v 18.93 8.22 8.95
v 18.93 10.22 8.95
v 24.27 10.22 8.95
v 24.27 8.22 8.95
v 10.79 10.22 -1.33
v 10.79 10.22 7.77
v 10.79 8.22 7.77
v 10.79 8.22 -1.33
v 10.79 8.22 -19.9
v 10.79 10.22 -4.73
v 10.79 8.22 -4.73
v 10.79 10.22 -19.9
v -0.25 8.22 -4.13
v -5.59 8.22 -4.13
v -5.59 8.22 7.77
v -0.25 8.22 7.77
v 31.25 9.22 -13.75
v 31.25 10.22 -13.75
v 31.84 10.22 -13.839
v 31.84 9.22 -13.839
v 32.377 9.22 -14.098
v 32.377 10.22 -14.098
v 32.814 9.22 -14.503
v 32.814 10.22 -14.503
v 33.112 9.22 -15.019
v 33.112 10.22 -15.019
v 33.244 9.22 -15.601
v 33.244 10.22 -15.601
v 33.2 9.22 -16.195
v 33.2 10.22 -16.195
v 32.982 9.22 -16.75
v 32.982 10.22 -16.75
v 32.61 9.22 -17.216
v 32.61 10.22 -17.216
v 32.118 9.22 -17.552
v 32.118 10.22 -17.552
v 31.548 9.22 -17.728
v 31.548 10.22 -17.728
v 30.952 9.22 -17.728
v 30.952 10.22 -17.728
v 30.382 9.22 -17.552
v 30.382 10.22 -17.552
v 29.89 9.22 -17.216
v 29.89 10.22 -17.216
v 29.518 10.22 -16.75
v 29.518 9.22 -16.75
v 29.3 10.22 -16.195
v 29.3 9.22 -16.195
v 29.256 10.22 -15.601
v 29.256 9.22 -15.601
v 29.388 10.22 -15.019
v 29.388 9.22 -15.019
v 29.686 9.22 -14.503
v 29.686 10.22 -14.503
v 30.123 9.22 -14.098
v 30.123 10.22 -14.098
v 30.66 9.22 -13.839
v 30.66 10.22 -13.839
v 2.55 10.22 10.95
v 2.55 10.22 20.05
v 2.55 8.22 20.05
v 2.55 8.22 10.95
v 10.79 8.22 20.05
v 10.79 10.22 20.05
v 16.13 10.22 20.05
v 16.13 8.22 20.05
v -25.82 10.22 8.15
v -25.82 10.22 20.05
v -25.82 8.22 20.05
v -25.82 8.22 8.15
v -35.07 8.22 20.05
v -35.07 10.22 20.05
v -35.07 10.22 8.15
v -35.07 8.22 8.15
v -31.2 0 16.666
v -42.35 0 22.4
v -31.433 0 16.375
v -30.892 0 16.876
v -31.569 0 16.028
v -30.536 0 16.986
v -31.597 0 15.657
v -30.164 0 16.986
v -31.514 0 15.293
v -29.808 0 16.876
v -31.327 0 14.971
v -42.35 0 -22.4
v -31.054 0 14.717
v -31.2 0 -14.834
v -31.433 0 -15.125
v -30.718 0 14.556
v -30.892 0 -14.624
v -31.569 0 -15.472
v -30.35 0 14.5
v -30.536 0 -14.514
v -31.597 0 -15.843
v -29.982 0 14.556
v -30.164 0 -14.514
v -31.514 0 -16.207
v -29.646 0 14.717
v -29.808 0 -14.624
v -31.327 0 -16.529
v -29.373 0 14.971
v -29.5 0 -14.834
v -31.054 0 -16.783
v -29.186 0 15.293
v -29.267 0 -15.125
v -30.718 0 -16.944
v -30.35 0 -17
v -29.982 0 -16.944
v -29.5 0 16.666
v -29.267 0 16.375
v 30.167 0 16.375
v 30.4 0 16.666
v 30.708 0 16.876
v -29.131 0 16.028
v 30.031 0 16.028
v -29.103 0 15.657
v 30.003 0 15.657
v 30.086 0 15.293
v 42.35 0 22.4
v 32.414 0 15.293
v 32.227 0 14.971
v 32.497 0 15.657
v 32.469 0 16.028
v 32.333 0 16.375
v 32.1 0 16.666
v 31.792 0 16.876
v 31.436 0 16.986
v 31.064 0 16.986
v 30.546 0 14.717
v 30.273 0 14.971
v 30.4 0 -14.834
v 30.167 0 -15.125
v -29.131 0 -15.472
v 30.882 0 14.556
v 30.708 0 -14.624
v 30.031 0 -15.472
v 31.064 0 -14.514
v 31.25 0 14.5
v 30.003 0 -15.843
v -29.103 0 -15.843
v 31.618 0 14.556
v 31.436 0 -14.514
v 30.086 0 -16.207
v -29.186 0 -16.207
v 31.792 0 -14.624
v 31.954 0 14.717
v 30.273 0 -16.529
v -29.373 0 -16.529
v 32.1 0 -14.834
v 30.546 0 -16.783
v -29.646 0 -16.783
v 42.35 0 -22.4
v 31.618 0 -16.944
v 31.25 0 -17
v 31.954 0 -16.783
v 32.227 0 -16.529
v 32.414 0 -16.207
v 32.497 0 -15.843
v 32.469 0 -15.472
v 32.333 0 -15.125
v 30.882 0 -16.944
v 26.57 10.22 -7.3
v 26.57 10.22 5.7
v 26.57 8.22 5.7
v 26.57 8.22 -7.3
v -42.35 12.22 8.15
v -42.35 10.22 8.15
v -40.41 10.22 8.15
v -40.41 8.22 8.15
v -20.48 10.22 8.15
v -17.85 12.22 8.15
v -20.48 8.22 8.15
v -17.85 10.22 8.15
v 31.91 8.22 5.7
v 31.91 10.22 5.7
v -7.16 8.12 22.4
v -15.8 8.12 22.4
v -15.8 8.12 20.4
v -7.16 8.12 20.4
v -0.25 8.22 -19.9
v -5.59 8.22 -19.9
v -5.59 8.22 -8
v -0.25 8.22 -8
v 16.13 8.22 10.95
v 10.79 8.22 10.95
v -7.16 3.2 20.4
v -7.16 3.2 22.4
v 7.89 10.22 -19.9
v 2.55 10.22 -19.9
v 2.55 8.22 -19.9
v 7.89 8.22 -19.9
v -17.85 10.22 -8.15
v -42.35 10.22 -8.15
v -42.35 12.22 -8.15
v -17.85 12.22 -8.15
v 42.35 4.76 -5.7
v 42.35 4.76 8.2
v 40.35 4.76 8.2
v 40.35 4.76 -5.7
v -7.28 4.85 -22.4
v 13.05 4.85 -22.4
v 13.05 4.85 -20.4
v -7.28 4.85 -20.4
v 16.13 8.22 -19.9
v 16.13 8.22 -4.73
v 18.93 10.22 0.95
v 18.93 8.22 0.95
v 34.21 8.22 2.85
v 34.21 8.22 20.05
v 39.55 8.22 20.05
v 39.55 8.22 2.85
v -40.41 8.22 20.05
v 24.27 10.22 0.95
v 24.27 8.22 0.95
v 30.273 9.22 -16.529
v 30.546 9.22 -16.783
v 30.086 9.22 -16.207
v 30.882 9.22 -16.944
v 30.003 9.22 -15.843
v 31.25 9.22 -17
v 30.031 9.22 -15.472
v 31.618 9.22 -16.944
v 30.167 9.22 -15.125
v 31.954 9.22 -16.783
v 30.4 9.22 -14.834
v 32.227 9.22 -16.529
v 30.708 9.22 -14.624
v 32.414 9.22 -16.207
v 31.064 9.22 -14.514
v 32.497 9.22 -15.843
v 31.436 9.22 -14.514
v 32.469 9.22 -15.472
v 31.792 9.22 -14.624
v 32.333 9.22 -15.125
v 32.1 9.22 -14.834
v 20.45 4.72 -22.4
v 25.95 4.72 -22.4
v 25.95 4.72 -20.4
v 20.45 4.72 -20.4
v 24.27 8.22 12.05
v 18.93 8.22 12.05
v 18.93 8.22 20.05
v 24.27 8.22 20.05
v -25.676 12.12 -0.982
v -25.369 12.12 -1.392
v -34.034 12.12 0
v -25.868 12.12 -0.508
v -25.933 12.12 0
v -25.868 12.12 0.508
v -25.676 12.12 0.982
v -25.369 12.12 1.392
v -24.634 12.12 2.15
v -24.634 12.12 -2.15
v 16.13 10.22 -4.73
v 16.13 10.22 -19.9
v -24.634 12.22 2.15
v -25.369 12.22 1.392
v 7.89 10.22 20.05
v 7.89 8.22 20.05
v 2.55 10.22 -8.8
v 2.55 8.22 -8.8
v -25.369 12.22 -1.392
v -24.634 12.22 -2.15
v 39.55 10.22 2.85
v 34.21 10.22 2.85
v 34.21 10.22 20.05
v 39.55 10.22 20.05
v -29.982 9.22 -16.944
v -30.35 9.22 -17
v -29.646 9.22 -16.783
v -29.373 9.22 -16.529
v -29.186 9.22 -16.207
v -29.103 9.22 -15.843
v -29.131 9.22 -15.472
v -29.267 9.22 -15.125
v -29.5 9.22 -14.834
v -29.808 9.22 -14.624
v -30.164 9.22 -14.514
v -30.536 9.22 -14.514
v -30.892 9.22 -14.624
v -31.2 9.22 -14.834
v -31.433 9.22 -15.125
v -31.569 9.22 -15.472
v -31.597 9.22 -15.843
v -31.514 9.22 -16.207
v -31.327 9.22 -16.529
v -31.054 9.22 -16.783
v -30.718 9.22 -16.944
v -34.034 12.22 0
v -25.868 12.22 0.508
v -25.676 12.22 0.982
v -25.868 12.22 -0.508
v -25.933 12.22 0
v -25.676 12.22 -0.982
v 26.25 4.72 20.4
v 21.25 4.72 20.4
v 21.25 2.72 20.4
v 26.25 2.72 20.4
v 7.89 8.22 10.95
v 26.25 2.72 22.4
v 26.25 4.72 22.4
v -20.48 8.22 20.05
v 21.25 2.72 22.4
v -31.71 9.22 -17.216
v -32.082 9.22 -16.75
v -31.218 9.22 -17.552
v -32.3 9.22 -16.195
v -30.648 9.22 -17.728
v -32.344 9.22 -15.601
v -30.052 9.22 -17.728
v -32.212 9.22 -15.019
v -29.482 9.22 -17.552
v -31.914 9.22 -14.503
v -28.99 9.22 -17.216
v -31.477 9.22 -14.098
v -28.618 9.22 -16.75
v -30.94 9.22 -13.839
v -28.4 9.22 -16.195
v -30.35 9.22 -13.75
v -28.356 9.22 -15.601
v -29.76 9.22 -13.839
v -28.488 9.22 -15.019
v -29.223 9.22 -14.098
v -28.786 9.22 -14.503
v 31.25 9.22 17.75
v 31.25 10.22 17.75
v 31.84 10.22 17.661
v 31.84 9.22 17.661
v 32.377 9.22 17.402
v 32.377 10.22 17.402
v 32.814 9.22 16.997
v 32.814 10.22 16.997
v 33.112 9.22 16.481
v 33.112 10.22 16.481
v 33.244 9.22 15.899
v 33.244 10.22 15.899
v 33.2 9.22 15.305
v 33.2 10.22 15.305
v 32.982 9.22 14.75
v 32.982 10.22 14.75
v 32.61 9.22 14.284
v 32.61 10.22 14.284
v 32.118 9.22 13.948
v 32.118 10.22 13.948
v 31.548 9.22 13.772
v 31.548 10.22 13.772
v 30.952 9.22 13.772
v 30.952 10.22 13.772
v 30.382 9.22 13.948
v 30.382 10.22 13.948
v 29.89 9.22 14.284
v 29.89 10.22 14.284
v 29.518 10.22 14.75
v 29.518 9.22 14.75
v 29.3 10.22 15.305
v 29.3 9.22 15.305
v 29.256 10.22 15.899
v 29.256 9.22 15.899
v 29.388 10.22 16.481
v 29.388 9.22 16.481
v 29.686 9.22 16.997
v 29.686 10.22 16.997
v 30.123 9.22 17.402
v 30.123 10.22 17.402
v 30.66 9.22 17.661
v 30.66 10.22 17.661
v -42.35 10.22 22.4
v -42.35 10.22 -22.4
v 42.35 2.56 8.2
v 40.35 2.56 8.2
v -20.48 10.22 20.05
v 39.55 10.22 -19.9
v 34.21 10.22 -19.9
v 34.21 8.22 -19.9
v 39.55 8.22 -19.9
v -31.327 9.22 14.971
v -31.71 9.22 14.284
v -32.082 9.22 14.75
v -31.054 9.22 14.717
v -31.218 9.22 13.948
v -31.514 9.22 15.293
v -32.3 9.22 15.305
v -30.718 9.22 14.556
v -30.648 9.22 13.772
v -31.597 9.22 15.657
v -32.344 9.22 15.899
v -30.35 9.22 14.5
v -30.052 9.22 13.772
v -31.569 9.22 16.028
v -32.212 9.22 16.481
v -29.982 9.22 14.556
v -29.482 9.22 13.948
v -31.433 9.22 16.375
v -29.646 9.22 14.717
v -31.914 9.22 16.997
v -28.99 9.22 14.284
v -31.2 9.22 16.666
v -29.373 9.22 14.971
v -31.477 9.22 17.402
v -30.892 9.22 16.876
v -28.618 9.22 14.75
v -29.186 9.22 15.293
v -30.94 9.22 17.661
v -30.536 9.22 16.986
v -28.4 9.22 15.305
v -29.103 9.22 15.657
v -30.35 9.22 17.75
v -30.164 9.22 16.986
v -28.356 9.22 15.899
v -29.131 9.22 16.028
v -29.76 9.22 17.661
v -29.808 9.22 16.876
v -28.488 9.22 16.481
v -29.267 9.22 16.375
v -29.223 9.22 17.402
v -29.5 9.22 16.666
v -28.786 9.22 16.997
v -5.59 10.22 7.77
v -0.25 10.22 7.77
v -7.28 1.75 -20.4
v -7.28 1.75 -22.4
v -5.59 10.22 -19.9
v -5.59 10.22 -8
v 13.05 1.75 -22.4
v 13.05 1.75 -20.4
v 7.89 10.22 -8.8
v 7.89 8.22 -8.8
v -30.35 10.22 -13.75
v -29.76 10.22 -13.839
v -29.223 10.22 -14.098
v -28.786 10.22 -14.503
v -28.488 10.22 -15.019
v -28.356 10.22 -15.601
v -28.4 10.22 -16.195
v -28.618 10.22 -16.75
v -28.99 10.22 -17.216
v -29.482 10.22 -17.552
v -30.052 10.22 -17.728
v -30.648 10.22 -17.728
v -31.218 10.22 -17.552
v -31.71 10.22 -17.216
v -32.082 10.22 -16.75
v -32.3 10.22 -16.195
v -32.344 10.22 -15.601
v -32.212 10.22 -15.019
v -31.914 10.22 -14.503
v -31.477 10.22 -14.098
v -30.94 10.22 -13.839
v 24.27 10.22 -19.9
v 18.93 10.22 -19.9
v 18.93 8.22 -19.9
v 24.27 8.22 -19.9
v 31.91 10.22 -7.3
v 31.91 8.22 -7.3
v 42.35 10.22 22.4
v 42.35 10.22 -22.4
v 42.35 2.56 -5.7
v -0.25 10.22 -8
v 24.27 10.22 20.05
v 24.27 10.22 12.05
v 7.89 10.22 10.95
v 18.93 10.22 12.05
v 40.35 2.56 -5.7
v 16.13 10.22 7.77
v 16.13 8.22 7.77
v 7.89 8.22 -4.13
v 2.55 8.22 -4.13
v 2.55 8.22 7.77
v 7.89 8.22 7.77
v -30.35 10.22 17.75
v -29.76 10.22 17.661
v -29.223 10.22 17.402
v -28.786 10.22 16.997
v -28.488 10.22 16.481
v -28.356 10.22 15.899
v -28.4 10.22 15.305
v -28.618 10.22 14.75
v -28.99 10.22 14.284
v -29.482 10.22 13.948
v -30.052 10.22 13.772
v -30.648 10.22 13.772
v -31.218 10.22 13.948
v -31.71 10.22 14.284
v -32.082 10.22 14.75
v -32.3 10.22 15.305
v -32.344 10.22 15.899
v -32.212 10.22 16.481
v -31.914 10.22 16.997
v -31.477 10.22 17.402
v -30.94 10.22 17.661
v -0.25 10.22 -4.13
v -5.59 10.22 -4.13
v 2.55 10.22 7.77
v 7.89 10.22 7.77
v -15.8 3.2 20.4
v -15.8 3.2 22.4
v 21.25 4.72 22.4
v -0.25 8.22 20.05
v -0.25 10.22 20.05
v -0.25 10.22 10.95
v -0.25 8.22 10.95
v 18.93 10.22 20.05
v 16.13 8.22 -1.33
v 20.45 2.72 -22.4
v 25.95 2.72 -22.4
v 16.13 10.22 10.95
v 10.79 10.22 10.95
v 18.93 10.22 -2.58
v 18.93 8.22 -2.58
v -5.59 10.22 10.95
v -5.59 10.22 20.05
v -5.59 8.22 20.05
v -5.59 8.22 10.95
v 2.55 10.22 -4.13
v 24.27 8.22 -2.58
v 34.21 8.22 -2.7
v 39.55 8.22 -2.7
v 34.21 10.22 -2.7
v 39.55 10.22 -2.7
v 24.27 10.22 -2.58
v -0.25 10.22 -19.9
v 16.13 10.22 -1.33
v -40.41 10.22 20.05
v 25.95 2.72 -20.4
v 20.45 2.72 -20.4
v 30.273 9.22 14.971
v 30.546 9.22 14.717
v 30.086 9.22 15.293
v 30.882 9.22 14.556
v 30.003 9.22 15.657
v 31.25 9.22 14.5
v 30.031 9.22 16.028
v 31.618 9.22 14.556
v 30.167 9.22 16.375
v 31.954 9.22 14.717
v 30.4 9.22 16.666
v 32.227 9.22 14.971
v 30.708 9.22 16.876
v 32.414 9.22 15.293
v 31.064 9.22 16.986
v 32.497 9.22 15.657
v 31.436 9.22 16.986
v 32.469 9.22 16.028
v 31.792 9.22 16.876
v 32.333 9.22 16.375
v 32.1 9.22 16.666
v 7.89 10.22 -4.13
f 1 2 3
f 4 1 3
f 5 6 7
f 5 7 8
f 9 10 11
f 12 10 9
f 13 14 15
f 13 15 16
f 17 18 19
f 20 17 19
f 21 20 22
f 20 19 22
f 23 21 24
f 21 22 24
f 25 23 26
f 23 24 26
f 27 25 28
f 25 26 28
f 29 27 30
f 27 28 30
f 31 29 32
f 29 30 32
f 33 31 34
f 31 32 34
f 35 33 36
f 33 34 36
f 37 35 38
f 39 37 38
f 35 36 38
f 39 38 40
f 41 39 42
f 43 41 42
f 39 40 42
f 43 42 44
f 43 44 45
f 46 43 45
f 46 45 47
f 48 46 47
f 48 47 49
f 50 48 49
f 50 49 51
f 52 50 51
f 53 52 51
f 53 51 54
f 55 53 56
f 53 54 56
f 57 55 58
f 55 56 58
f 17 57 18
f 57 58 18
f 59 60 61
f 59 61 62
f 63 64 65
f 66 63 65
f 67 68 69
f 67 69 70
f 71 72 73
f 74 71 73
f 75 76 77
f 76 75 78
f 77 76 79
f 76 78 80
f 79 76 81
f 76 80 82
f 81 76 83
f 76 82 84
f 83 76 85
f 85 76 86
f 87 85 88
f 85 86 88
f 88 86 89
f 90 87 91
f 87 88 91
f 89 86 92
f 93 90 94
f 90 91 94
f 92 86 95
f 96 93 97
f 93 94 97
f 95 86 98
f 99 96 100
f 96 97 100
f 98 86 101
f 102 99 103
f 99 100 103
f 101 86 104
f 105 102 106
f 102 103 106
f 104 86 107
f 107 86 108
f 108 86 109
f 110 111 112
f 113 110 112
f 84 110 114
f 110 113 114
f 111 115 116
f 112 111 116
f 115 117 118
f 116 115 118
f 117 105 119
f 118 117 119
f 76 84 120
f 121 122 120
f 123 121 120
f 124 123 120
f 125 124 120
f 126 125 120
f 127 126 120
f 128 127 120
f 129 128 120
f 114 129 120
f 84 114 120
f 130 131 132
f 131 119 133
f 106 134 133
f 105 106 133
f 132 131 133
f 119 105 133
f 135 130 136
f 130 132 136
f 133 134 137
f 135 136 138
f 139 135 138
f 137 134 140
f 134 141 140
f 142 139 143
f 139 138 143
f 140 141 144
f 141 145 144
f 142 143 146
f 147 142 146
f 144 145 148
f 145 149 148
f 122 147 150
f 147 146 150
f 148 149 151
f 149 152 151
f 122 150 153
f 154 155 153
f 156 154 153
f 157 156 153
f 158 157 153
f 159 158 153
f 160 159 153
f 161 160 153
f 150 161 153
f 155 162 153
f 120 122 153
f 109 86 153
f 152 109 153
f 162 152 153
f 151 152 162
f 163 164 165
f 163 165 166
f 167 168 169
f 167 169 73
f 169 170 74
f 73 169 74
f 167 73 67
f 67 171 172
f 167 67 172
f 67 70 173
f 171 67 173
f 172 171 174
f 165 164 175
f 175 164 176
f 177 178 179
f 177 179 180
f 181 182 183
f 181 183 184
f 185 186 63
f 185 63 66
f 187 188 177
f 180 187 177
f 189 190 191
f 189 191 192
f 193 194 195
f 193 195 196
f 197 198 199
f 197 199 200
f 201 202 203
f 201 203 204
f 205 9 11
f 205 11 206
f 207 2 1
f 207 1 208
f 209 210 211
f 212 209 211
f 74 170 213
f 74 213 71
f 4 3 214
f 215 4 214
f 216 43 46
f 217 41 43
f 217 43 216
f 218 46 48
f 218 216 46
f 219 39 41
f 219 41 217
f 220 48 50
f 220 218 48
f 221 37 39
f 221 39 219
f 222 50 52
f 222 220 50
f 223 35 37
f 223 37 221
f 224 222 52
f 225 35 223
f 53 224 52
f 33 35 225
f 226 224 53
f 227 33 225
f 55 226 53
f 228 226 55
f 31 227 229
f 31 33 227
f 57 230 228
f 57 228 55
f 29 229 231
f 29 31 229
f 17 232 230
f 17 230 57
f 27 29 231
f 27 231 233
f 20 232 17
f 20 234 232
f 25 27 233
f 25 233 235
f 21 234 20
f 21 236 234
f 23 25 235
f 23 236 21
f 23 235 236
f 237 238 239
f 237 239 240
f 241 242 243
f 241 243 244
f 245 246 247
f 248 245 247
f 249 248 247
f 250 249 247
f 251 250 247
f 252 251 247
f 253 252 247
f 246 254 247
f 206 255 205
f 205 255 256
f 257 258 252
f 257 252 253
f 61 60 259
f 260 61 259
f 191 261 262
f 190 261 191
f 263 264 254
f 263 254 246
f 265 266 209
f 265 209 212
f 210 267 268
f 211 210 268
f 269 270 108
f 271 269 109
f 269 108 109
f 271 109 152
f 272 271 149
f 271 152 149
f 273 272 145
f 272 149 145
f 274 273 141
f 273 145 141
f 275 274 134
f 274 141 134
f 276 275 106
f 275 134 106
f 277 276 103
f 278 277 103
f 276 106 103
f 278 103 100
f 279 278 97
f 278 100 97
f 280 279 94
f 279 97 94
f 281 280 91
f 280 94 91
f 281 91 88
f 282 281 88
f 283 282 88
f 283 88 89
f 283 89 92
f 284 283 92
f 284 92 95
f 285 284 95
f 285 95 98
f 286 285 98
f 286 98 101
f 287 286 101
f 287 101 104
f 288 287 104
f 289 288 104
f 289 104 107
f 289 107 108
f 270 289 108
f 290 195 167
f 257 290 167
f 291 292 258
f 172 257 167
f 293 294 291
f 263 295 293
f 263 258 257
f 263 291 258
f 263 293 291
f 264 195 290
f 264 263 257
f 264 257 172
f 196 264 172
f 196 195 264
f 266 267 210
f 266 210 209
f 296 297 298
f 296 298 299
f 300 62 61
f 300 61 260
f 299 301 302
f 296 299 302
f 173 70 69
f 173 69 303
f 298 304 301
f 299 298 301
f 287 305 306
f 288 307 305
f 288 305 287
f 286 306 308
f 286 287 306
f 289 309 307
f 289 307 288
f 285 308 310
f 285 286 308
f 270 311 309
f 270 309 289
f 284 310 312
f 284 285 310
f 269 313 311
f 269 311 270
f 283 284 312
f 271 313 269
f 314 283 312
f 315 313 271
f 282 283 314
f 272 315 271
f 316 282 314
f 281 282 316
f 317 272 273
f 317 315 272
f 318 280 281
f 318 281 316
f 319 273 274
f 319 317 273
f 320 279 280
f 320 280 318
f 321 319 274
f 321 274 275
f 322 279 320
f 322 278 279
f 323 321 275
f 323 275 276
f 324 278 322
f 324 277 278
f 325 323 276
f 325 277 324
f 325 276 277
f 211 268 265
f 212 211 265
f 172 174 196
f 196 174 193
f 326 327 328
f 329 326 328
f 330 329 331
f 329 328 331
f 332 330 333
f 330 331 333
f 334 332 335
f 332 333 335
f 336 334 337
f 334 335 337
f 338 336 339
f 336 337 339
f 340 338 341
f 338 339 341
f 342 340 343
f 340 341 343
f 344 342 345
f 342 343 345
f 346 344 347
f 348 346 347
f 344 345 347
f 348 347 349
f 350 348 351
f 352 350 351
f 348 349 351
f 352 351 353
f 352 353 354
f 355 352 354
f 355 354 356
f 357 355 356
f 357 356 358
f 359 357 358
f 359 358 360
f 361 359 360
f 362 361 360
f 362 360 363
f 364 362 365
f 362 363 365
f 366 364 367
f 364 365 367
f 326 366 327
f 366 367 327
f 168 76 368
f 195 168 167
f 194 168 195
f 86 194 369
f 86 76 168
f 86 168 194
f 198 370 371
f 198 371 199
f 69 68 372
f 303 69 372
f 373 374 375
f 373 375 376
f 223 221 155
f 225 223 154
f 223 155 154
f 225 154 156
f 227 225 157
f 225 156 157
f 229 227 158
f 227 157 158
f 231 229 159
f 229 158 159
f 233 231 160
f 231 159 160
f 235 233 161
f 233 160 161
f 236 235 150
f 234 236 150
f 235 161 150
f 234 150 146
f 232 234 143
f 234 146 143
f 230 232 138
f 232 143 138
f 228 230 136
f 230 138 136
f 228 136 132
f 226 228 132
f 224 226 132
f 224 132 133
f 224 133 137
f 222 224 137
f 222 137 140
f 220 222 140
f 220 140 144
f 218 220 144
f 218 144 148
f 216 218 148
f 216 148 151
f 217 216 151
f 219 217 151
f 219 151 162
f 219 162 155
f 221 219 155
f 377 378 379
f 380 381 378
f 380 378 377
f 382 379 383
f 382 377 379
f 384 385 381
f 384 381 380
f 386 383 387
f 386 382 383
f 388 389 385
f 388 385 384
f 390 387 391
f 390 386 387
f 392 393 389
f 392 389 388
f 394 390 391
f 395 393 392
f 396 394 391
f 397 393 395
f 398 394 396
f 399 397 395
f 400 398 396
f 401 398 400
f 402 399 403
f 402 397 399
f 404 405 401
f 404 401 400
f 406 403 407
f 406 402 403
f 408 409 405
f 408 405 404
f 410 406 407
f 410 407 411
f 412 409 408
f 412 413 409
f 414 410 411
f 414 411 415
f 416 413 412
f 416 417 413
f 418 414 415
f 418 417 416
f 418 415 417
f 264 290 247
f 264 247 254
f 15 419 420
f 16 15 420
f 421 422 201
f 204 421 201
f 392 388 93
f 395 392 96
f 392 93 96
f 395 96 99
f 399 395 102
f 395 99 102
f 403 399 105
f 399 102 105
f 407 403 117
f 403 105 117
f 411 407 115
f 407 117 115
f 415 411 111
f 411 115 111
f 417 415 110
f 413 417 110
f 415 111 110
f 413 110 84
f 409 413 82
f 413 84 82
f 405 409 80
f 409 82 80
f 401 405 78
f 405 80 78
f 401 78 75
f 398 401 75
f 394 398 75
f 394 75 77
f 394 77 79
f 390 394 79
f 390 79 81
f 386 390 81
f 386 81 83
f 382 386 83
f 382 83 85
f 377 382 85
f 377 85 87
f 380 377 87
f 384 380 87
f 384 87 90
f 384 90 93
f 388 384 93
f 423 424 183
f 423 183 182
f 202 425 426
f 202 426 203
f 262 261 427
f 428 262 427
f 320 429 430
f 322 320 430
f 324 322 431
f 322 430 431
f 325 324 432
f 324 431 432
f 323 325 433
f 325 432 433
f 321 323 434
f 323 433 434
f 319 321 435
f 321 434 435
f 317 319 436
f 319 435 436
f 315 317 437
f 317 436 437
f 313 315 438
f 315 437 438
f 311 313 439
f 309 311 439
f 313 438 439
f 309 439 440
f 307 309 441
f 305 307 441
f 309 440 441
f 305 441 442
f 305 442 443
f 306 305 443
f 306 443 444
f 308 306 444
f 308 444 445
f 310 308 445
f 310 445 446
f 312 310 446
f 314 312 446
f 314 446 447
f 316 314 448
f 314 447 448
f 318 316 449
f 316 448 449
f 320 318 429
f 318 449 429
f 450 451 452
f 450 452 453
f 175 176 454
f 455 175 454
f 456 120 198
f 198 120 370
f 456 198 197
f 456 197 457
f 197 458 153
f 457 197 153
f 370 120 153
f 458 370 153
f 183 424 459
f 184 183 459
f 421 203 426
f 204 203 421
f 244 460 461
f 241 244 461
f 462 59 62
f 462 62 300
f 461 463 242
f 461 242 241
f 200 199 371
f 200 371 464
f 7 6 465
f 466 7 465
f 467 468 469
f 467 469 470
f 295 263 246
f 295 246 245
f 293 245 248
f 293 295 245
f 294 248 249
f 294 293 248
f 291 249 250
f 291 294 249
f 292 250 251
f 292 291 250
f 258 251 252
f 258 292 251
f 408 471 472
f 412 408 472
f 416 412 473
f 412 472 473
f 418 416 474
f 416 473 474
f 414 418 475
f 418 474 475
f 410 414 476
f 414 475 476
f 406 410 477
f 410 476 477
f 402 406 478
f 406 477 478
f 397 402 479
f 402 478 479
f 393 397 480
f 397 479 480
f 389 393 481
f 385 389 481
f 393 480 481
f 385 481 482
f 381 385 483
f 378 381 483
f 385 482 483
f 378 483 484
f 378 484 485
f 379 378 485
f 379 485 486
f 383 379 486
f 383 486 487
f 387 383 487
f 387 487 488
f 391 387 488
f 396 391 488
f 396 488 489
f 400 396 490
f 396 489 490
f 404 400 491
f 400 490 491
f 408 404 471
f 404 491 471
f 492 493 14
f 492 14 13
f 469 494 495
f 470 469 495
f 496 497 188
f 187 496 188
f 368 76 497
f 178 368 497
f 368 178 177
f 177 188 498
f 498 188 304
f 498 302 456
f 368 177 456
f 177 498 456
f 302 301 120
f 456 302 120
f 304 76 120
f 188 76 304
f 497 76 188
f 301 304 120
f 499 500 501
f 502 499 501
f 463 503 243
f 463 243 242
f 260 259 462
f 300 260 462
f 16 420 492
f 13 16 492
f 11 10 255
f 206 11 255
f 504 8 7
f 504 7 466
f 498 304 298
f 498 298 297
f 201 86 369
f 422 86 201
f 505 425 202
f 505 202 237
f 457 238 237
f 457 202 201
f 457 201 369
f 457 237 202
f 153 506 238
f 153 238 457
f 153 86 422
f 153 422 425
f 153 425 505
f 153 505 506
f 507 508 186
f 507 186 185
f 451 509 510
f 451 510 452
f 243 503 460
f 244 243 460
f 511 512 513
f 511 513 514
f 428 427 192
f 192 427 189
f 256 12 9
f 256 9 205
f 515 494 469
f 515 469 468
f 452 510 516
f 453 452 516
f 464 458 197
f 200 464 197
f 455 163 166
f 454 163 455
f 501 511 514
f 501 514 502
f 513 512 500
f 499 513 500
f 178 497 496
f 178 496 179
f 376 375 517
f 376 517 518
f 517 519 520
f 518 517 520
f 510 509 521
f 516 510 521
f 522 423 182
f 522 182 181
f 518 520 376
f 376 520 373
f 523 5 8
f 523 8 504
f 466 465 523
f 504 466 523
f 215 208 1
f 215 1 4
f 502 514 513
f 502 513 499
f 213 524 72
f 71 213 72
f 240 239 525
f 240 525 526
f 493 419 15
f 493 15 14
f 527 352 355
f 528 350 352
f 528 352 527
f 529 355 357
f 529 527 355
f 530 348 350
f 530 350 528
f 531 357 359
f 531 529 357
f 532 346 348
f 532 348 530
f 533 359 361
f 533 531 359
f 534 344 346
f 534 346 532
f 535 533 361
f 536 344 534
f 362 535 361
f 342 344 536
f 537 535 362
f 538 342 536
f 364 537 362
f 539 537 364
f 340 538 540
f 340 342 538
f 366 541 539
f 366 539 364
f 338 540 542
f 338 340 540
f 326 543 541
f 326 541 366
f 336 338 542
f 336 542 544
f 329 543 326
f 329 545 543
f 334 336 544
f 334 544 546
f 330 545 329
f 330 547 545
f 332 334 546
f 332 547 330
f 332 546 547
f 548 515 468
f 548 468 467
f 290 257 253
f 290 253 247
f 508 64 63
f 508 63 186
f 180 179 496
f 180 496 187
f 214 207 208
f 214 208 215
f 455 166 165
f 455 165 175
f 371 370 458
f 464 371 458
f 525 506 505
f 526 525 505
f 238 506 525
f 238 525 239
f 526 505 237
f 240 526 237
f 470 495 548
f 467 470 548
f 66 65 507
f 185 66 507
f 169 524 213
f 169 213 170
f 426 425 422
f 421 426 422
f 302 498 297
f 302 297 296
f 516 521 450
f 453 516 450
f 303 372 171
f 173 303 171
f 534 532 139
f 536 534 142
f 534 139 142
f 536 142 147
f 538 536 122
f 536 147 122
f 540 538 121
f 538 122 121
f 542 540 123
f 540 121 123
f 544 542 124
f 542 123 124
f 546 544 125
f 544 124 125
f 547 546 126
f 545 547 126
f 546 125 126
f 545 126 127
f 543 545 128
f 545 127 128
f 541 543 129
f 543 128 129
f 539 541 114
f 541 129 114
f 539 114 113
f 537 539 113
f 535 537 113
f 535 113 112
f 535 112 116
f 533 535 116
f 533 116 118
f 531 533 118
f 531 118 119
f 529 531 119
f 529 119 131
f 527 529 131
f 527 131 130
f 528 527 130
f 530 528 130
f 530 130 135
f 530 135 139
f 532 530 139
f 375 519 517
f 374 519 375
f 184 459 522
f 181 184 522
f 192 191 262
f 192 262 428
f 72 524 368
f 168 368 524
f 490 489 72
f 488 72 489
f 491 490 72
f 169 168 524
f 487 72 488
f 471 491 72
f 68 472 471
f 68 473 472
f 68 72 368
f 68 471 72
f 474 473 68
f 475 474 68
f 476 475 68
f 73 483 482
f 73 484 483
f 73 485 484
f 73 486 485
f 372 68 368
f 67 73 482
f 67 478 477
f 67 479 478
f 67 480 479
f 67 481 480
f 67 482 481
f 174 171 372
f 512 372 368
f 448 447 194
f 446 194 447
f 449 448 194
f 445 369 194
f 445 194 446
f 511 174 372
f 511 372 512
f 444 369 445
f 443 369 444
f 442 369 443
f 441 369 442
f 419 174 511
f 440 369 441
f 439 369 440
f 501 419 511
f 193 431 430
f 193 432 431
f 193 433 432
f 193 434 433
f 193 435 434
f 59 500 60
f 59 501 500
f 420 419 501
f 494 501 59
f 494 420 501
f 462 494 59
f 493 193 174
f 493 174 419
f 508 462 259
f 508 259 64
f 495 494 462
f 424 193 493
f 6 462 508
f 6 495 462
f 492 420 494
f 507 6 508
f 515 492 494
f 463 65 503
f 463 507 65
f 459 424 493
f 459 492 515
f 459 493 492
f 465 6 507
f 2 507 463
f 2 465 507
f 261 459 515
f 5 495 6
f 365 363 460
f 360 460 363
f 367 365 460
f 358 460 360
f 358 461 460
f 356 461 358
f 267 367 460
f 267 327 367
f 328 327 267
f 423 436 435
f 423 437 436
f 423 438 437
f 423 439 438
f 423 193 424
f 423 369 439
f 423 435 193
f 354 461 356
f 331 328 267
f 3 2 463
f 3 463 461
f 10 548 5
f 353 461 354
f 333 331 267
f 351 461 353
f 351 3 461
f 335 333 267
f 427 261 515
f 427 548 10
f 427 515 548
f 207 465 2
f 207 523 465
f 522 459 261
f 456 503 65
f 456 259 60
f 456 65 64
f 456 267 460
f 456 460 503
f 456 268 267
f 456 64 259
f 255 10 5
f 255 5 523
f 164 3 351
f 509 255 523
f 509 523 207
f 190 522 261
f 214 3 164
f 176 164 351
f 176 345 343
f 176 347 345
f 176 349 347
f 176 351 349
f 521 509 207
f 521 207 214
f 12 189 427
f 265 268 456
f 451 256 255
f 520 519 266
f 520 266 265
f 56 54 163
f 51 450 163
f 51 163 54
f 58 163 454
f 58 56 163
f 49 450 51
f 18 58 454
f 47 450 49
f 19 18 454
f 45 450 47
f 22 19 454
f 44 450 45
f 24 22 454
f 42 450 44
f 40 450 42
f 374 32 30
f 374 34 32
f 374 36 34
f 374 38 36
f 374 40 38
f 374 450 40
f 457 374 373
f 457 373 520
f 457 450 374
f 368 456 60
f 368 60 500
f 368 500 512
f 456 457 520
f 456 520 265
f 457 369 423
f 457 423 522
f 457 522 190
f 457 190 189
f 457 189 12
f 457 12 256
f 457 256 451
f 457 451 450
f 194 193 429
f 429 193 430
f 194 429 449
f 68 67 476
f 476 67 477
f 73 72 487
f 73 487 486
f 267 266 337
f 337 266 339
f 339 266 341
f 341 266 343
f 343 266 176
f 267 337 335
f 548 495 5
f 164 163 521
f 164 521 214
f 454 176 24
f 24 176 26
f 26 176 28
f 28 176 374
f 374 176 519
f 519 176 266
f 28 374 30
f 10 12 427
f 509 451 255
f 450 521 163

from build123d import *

# Parameters (mm, degrees)
SKETCH1_W           = 84.7
SKETCH1_H           = 44.8
BOSS_EXTRUDE1_DEPTH = 10.22
SKETCH2_W           = 24.5
SKETCH2_H           = 16.3
BOSS_EXTRUDE2_DEPTH = 2
SKETCH3_W           = 5.34
SKETCH3_H           = 11.9
SKETCH3_H_2         = 9.1
SKETCH3_H_3         = 8
SKETCH3_H_4         = 17.2
SKETCH3_H_5         = 11.1
SKETCH3_H_6         = 15.17
SKETCH3_H_7         = 17.32
SKETCH3_H_8         = 13
CUT_EXTRUDE1_DEPTH  = 2
SKETCH4_R           = 1.25
CUT_EXTRUDE2_DEPTH  = 50.443006583
SKETCH5_R           = 2
CUT_EXTRUDE3_DEPTH  = 1
SKETCH6_W           = 8.64
SKETCH6_H           = 4.92
CUT_EXTRUDE4_DEPTH  = 2
SKETCH7_W           = 5
SKETCH7_H           = 2
CUT_EXTRUDE5_DEPTH  = 2
SKETCH8_W           = 20.33
SKETCH8_H           = 3.1
SKETCH8_W_2         = 5.5
SKETCH8_H_2         = 2
CUT_EXTRUDE6_DEPTH  = 2
SKETCH9_W           = 13.9
SKETCH9_H           = 2.2
CUT_EXTRUDE7_DEPTH  = 2
CUT_EXTRUDE8_DEPTH  = 0.1


with BuildPart() as part:
    # Sketch1 → Boss-Extrude1 (new body)
    with BuildSketch(Plane(origin=(0, 0, 0), x_dir=(1, 0, 0), z_dir=(0, 1, 0))):
        Rectangle(SKETCH1_W, SKETCH1_H)
    extrude(amount=BOSS_EXTRUDE1_DEPTH)

    # Sketch2 → Boss-Extrude2 (add)
    with BuildSketch(Plane(origin=(0, 10.22, 0), x_dir=(1, 0, 0), z_dir=(0, 1, 0))):
        with Locations((-30.1, 0)):
            Rectangle(SKETCH2_W, SKETCH2_H)
    extrude(amount=BOSS_EXTRUDE2_DEPTH)

    # Sketch3 → Cut-Extrude1 (cut)
    with BuildSketch(Plane(origin=(0, 10.22, 0), x_dir=(1, 0, 0), z_dir=(0, 1, 0))):
        with Locations((-37.74, -14.1)):
            Rectangle(SKETCH3_W, SKETCH3_H)
        with Locations((-23.15, -14.1)):
            Rectangle(SKETCH3_W, SKETCH3_H)
        with Locations((-2.92, -15.5)):
            Rectangle(SKETCH3_W, SKETCH3_H_2)
        with Locations((5.22, -15.5)):
            Rectangle(SKETCH3_W, SKETCH3_H_2)
        with Locations((13.46, -15.5)):
            Rectangle(SKETCH3_W, SKETCH3_H_2)
        with Locations((21.6, -16.05)):
            Rectangle(SKETCH3_W, SKETCH3_H_3)
        with Locations((21.6, -4.95)):
            Rectangle(SKETCH3_W, SKETCH3_H_3)
        with Locations((36.88, -11.45)):
            Rectangle(SKETCH3_W, SKETCH3_H_4)
        with Locations((-2.92, -1.82)):
            Rectangle(SKETCH3_W, SKETCH3_H)
        with Locations((5.22, -1.82)):
            Rectangle(SKETCH3_W, SKETCH3_H)
        with Locations((13.46, -3.22)):
            Rectangle(SKETCH3_W, SKETCH3_H_2)
        with Locations((-2.92, 13.95)):
            Rectangle(SKETCH3_W, SKETCH3_H)
        with Locations((5.22, 14.35)):
            Rectangle(SKETCH3_W, SKETCH3_H_5)
        with Locations((13.46, 12.315)):
            Rectangle(SKETCH3_W, SKETCH3_H_6)
        with Locations((21.6, 11.24)):
            Rectangle(SKETCH3_W, SKETCH3_H_7)
        with Locations((29.24, 0.8)):
            Rectangle(SKETCH3_W, SKETCH3_H_8)
        with Locations((36.88, 11.3)):
            Rectangle(SKETCH3_W, SKETCH3_H_4)
    extrude(amount=-CUT_EXTRUDE1_DEPTH, mode=Mode.SUBTRACT)

    # Sketch4 → Cut-Extrude2 (cut, through all)
    with BuildSketch(Plane.XZ):
        with Locations(Location((-30.35, 15.75, 0), (0, 0, 270))):
            Circle(SKETCH4_R)
        with Locations(Location((31.25, 15.75, 0), (0, 0, 270))):
            Circle(SKETCH4_R)
        with Locations(Location((31.25, -15.75, 0), (0, 0, 270))):
            Circle(SKETCH4_R)
        with Locations(Location((-30.35, -15.75, 0), (0, 0, 270))):
            Circle(SKETCH4_R)
    extrude(amount=-CUT_EXTRUDE2_DEPTH, mode=Mode.SUBTRACT)

    # Sketch5 → Cut-Extrude3 (cut)
    with BuildSketch(Plane(origin=(0, 10.22, 0), x_dir=(1, 0, 0), z_dir=(0, 1, 0))):
        with Locations(Location((-30.35, 15.75, 0), (0, 0, 270))):
            Circle(SKETCH5_R)
        with Locations(Location((-30.35, -15.75, 0), (0, 0, 270))):
            Circle(SKETCH5_R)
        with Locations(Location((31.25, 15.75, 0), (0, 0, 270))):
            Circle(SKETCH5_R)
        with Locations(Location((31.25, -15.75, 0), (0, 0, 270))):
            Circle(SKETCH5_R)
    extrude(amount=-CUT_EXTRUDE3_DEPTH, mode=Mode.SUBTRACT)

    # Sketch6 → Cut-Extrude4 (cut)
    with BuildSketch(Plane.XY.offset(22.4)):
        with Locations((-11.48, 5.66)):
            Rectangle(SKETCH6_W, SKETCH6_H)
    extrude(amount=-CUT_EXTRUDE4_DEPTH, mode=Mode.SUBTRACT)

    # Sketch7 → Cut-Extrude5 (cut)
    with BuildSketch(Plane.XY.offset(22.4)):
        with Locations((23.75, 3.72)):
            Rectangle(SKETCH7_W, SKETCH7_H)
    extrude(amount=-CUT_EXTRUDE5_DEPTH, mode=Mode.SUBTRACT)

    # Sketch8 → Cut-Extrude6 (cut)
    with BuildSketch(Plane(origin=(0, 0, -22.4), x_dir=(-1, 0, 0), z_dir=(0, 0, -1))):
        with Locations((-2.885, 3.3)):
            Rectangle(SKETCH8_W, SKETCH8_H)
        with Locations((-23.2, 3.72)):
            Rectangle(SKETCH8_W_2, SKETCH8_H_2)
    extrude(amount=-CUT_EXTRUDE6_DEPTH, mode=Mode.SUBTRACT)

    # Sketch9 → Cut-Extrude7 (cut)
    with BuildSketch(Plane(origin=(42.35, 0, 0), x_dir=(0, 0, -1), z_dir=(1, 0, 0))):
        with Locations((-1.25, 3.66)):
            Rectangle(SKETCH9_W, SKETCH9_H)
    extrude(amount=-CUT_EXTRUDE7_DEPTH, mode=Mode.SUBTRACT)

    # Sketch10 → Cut-Extrude8 (cut)
    with BuildSketch(Plane(origin=(0, 12.22, 0), x_dir=(1, 0, 0), z_dir=(0, 1, 0))):
        with BuildLine():
            Line((-34.034433703, 0), (-24.634433703, 2.15))
            Line((-24.634433703, 2.15), (-25.369176186, 1.392199815))
            ThreePointArc((-25.369176186, 1.392199815), (-25.933286331, 0), (-25.369176186, -1.392199815))
            Line((-25.369176186, -1.392199815), (-24.634433703, -2.15))
            Line((-24.634433703, -2.15), (-34.034433703, 0))
        make_face()
    extrude(amount=-CUT_EXTRUDE8_DEPTH, mode=Mode.SUBTRACT)


solid = part.part
